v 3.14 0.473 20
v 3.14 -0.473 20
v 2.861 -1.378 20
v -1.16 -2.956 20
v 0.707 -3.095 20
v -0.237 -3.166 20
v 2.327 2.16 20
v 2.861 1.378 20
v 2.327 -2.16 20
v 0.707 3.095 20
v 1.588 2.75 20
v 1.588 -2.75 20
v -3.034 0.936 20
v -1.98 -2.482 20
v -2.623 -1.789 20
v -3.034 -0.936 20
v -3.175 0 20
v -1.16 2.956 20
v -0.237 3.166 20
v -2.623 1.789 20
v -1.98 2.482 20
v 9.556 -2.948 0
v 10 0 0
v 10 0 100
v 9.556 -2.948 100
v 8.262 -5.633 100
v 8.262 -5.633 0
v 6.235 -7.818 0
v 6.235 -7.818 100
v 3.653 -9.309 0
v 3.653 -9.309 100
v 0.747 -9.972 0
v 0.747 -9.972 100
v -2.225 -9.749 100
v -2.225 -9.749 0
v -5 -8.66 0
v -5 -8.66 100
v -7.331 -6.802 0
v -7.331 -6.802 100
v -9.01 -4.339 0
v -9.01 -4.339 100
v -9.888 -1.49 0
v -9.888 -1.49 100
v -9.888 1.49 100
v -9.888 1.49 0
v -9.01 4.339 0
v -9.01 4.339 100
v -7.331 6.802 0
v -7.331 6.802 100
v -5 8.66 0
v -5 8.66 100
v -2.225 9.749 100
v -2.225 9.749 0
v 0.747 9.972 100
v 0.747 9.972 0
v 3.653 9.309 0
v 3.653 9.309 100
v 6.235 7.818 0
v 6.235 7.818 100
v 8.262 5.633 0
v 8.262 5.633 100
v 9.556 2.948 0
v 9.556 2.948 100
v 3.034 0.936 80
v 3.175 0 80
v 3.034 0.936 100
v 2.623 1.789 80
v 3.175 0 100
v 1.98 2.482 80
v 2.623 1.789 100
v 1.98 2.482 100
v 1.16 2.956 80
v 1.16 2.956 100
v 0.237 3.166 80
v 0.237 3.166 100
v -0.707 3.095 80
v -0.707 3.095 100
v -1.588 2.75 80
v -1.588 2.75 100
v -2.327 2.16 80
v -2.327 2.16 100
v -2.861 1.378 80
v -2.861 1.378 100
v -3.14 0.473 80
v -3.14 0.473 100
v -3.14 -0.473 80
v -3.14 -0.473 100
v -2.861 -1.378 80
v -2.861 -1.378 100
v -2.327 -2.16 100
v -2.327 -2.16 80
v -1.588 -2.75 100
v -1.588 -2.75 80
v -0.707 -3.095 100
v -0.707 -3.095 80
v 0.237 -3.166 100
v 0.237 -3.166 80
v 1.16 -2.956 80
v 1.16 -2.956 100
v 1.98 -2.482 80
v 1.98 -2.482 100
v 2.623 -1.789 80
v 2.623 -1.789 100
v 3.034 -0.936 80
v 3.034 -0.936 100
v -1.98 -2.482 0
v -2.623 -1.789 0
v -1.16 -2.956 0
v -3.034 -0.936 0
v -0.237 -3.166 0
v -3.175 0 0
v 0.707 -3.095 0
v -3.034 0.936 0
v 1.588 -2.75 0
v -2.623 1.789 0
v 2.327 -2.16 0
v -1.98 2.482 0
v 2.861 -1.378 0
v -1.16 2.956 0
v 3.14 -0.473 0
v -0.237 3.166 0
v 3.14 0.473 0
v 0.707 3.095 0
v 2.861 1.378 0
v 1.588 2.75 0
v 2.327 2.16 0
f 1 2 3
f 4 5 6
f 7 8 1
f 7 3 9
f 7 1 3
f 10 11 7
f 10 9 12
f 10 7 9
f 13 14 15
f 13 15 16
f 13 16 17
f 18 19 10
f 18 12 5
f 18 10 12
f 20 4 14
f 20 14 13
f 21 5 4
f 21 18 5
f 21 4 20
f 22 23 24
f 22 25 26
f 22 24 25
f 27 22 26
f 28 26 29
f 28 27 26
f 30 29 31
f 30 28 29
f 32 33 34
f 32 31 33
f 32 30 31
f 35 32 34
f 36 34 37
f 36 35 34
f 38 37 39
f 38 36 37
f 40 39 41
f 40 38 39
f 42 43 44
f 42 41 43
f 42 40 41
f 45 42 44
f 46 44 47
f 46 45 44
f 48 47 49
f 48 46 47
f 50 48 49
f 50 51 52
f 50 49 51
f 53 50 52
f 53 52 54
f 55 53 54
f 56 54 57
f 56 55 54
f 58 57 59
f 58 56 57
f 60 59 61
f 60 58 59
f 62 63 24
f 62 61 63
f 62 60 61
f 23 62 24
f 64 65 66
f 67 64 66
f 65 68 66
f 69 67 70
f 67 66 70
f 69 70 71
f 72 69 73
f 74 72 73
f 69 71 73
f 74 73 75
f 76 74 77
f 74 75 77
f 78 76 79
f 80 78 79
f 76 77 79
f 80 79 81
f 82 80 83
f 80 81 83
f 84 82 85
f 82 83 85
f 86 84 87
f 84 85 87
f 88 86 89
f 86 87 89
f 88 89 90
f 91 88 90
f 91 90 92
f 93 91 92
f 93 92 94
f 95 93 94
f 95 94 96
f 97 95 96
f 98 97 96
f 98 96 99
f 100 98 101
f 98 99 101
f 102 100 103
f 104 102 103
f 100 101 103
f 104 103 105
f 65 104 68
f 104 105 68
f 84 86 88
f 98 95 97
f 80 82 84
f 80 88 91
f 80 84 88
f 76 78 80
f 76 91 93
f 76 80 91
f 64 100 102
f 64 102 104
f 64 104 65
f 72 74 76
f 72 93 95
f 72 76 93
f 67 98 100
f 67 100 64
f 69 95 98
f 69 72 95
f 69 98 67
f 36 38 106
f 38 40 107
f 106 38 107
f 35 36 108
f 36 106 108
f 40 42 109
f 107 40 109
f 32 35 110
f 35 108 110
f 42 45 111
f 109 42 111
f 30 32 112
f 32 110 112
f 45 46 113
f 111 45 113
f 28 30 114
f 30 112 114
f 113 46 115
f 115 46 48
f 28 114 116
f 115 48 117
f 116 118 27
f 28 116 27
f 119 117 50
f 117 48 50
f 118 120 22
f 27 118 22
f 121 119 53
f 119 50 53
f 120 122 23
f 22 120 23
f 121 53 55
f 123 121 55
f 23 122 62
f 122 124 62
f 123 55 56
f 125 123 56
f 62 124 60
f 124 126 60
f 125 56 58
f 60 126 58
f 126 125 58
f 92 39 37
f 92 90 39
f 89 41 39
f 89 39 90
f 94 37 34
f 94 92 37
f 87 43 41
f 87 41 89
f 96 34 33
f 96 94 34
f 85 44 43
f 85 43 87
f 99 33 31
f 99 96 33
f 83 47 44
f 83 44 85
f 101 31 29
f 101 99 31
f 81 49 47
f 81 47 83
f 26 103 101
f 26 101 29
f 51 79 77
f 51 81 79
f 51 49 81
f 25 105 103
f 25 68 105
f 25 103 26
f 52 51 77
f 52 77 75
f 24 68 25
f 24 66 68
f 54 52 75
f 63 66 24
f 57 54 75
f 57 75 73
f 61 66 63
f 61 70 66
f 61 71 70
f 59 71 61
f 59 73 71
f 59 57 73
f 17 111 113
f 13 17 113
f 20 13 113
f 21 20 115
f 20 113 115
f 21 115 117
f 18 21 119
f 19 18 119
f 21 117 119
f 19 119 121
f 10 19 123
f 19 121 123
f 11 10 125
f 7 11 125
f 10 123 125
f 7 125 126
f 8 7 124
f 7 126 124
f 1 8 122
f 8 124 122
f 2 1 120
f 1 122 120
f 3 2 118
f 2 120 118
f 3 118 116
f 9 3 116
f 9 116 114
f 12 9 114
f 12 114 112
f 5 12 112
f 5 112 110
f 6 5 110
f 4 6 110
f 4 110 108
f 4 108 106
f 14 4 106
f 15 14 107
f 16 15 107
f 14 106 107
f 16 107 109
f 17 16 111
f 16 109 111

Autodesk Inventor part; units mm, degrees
ref_plane "YZ Plane" through (0, 0, 0) normal (1, 0, 0) x (0, 1, 0)
ref_plane "XZ Plane" through (0, 0, 0) normal (0, 1, 0) x (-1, 0, 0)
ref_plane "XY Plane" through (0, 0, 0) normal (0, 0, 1) x (1, 0, 0)
sketch "Sketch1" plane through (0, 0, 0) normal (0, 0, 1) x (1, 0, 0)
  circle A0 centre (0, 0) radius 10
  dimension "d0" = 20
extrude "Extrusion1" add sketch "Sketch1" along normal blind 100
sketch "Sketch2" plane through (0, 0, 100) normal (0, 0, 1) x (1, 0, 0)
  circle A0 centre (0, 0) radius 3.175
  dimension "d3" = 6.35
extrude "Extrusion2" cut sketch "Sketch2" against normal blind 20
sketch "Sketch3" plane through (0, 0, 0) normal (0, 0, -1) x (-1, 0, 0)
  circle A0 centre (0, 0) radius 3.175 projected
  circle A1 centre (0, 0) radius 3.175
  dimension "d6" = 6.35
extrude "Extrusion3" cut sketch "Sketch3" against normal blind 20
properties part number "SupportRods"
